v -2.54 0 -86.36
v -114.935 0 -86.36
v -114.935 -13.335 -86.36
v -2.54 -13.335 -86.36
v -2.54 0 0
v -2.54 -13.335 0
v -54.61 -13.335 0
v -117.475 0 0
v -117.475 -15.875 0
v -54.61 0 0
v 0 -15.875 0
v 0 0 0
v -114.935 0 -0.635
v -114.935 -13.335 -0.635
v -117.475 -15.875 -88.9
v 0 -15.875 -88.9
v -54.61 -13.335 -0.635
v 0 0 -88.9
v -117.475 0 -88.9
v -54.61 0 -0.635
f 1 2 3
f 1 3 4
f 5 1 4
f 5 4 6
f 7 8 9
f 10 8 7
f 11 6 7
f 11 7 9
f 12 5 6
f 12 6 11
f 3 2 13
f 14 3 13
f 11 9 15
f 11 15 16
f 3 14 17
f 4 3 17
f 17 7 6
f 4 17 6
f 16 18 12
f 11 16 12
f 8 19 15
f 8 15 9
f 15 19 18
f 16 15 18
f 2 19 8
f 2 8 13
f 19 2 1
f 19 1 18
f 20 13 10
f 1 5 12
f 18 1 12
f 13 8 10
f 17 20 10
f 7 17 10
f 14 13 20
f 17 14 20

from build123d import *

# Parameters (mm, degrees)
F0_W     = 117.475
F0_H     = 88.9
F1_DEPTH = 15.875
F2_T     = -2.54
F3_W     = 60.325
F3_H     = 0.635
F4_DEPTH = 13.335


with BuildPart() as f1:
    # F0 (on Front) → F1 (new body)
    with BuildSketch(Plane.XZ):
        with Locations((-58.7375, -44.45)):
            Rectangle(F0_W, F0_H)
    extrude(amount=F1_DEPTH)

    # F2
    f2_openings = [f1.faces().sort_by_distance(p)[0] for p in [
        (-58.7375, 0, -44.45),
        (-58.7375, -7.9375, 0),
    ]]
    offset(amount=F2_T, openings=f2_openings)

    # F3 (on Front) → F4 (join, through all)
    with BuildSketch(Plane.XZ):
        with Locations((-84.7725, -0.3175)):
            Rectangle(F3_W, F3_H)
    extrude(amount=F4_DEPTH)


solid = f1.part
